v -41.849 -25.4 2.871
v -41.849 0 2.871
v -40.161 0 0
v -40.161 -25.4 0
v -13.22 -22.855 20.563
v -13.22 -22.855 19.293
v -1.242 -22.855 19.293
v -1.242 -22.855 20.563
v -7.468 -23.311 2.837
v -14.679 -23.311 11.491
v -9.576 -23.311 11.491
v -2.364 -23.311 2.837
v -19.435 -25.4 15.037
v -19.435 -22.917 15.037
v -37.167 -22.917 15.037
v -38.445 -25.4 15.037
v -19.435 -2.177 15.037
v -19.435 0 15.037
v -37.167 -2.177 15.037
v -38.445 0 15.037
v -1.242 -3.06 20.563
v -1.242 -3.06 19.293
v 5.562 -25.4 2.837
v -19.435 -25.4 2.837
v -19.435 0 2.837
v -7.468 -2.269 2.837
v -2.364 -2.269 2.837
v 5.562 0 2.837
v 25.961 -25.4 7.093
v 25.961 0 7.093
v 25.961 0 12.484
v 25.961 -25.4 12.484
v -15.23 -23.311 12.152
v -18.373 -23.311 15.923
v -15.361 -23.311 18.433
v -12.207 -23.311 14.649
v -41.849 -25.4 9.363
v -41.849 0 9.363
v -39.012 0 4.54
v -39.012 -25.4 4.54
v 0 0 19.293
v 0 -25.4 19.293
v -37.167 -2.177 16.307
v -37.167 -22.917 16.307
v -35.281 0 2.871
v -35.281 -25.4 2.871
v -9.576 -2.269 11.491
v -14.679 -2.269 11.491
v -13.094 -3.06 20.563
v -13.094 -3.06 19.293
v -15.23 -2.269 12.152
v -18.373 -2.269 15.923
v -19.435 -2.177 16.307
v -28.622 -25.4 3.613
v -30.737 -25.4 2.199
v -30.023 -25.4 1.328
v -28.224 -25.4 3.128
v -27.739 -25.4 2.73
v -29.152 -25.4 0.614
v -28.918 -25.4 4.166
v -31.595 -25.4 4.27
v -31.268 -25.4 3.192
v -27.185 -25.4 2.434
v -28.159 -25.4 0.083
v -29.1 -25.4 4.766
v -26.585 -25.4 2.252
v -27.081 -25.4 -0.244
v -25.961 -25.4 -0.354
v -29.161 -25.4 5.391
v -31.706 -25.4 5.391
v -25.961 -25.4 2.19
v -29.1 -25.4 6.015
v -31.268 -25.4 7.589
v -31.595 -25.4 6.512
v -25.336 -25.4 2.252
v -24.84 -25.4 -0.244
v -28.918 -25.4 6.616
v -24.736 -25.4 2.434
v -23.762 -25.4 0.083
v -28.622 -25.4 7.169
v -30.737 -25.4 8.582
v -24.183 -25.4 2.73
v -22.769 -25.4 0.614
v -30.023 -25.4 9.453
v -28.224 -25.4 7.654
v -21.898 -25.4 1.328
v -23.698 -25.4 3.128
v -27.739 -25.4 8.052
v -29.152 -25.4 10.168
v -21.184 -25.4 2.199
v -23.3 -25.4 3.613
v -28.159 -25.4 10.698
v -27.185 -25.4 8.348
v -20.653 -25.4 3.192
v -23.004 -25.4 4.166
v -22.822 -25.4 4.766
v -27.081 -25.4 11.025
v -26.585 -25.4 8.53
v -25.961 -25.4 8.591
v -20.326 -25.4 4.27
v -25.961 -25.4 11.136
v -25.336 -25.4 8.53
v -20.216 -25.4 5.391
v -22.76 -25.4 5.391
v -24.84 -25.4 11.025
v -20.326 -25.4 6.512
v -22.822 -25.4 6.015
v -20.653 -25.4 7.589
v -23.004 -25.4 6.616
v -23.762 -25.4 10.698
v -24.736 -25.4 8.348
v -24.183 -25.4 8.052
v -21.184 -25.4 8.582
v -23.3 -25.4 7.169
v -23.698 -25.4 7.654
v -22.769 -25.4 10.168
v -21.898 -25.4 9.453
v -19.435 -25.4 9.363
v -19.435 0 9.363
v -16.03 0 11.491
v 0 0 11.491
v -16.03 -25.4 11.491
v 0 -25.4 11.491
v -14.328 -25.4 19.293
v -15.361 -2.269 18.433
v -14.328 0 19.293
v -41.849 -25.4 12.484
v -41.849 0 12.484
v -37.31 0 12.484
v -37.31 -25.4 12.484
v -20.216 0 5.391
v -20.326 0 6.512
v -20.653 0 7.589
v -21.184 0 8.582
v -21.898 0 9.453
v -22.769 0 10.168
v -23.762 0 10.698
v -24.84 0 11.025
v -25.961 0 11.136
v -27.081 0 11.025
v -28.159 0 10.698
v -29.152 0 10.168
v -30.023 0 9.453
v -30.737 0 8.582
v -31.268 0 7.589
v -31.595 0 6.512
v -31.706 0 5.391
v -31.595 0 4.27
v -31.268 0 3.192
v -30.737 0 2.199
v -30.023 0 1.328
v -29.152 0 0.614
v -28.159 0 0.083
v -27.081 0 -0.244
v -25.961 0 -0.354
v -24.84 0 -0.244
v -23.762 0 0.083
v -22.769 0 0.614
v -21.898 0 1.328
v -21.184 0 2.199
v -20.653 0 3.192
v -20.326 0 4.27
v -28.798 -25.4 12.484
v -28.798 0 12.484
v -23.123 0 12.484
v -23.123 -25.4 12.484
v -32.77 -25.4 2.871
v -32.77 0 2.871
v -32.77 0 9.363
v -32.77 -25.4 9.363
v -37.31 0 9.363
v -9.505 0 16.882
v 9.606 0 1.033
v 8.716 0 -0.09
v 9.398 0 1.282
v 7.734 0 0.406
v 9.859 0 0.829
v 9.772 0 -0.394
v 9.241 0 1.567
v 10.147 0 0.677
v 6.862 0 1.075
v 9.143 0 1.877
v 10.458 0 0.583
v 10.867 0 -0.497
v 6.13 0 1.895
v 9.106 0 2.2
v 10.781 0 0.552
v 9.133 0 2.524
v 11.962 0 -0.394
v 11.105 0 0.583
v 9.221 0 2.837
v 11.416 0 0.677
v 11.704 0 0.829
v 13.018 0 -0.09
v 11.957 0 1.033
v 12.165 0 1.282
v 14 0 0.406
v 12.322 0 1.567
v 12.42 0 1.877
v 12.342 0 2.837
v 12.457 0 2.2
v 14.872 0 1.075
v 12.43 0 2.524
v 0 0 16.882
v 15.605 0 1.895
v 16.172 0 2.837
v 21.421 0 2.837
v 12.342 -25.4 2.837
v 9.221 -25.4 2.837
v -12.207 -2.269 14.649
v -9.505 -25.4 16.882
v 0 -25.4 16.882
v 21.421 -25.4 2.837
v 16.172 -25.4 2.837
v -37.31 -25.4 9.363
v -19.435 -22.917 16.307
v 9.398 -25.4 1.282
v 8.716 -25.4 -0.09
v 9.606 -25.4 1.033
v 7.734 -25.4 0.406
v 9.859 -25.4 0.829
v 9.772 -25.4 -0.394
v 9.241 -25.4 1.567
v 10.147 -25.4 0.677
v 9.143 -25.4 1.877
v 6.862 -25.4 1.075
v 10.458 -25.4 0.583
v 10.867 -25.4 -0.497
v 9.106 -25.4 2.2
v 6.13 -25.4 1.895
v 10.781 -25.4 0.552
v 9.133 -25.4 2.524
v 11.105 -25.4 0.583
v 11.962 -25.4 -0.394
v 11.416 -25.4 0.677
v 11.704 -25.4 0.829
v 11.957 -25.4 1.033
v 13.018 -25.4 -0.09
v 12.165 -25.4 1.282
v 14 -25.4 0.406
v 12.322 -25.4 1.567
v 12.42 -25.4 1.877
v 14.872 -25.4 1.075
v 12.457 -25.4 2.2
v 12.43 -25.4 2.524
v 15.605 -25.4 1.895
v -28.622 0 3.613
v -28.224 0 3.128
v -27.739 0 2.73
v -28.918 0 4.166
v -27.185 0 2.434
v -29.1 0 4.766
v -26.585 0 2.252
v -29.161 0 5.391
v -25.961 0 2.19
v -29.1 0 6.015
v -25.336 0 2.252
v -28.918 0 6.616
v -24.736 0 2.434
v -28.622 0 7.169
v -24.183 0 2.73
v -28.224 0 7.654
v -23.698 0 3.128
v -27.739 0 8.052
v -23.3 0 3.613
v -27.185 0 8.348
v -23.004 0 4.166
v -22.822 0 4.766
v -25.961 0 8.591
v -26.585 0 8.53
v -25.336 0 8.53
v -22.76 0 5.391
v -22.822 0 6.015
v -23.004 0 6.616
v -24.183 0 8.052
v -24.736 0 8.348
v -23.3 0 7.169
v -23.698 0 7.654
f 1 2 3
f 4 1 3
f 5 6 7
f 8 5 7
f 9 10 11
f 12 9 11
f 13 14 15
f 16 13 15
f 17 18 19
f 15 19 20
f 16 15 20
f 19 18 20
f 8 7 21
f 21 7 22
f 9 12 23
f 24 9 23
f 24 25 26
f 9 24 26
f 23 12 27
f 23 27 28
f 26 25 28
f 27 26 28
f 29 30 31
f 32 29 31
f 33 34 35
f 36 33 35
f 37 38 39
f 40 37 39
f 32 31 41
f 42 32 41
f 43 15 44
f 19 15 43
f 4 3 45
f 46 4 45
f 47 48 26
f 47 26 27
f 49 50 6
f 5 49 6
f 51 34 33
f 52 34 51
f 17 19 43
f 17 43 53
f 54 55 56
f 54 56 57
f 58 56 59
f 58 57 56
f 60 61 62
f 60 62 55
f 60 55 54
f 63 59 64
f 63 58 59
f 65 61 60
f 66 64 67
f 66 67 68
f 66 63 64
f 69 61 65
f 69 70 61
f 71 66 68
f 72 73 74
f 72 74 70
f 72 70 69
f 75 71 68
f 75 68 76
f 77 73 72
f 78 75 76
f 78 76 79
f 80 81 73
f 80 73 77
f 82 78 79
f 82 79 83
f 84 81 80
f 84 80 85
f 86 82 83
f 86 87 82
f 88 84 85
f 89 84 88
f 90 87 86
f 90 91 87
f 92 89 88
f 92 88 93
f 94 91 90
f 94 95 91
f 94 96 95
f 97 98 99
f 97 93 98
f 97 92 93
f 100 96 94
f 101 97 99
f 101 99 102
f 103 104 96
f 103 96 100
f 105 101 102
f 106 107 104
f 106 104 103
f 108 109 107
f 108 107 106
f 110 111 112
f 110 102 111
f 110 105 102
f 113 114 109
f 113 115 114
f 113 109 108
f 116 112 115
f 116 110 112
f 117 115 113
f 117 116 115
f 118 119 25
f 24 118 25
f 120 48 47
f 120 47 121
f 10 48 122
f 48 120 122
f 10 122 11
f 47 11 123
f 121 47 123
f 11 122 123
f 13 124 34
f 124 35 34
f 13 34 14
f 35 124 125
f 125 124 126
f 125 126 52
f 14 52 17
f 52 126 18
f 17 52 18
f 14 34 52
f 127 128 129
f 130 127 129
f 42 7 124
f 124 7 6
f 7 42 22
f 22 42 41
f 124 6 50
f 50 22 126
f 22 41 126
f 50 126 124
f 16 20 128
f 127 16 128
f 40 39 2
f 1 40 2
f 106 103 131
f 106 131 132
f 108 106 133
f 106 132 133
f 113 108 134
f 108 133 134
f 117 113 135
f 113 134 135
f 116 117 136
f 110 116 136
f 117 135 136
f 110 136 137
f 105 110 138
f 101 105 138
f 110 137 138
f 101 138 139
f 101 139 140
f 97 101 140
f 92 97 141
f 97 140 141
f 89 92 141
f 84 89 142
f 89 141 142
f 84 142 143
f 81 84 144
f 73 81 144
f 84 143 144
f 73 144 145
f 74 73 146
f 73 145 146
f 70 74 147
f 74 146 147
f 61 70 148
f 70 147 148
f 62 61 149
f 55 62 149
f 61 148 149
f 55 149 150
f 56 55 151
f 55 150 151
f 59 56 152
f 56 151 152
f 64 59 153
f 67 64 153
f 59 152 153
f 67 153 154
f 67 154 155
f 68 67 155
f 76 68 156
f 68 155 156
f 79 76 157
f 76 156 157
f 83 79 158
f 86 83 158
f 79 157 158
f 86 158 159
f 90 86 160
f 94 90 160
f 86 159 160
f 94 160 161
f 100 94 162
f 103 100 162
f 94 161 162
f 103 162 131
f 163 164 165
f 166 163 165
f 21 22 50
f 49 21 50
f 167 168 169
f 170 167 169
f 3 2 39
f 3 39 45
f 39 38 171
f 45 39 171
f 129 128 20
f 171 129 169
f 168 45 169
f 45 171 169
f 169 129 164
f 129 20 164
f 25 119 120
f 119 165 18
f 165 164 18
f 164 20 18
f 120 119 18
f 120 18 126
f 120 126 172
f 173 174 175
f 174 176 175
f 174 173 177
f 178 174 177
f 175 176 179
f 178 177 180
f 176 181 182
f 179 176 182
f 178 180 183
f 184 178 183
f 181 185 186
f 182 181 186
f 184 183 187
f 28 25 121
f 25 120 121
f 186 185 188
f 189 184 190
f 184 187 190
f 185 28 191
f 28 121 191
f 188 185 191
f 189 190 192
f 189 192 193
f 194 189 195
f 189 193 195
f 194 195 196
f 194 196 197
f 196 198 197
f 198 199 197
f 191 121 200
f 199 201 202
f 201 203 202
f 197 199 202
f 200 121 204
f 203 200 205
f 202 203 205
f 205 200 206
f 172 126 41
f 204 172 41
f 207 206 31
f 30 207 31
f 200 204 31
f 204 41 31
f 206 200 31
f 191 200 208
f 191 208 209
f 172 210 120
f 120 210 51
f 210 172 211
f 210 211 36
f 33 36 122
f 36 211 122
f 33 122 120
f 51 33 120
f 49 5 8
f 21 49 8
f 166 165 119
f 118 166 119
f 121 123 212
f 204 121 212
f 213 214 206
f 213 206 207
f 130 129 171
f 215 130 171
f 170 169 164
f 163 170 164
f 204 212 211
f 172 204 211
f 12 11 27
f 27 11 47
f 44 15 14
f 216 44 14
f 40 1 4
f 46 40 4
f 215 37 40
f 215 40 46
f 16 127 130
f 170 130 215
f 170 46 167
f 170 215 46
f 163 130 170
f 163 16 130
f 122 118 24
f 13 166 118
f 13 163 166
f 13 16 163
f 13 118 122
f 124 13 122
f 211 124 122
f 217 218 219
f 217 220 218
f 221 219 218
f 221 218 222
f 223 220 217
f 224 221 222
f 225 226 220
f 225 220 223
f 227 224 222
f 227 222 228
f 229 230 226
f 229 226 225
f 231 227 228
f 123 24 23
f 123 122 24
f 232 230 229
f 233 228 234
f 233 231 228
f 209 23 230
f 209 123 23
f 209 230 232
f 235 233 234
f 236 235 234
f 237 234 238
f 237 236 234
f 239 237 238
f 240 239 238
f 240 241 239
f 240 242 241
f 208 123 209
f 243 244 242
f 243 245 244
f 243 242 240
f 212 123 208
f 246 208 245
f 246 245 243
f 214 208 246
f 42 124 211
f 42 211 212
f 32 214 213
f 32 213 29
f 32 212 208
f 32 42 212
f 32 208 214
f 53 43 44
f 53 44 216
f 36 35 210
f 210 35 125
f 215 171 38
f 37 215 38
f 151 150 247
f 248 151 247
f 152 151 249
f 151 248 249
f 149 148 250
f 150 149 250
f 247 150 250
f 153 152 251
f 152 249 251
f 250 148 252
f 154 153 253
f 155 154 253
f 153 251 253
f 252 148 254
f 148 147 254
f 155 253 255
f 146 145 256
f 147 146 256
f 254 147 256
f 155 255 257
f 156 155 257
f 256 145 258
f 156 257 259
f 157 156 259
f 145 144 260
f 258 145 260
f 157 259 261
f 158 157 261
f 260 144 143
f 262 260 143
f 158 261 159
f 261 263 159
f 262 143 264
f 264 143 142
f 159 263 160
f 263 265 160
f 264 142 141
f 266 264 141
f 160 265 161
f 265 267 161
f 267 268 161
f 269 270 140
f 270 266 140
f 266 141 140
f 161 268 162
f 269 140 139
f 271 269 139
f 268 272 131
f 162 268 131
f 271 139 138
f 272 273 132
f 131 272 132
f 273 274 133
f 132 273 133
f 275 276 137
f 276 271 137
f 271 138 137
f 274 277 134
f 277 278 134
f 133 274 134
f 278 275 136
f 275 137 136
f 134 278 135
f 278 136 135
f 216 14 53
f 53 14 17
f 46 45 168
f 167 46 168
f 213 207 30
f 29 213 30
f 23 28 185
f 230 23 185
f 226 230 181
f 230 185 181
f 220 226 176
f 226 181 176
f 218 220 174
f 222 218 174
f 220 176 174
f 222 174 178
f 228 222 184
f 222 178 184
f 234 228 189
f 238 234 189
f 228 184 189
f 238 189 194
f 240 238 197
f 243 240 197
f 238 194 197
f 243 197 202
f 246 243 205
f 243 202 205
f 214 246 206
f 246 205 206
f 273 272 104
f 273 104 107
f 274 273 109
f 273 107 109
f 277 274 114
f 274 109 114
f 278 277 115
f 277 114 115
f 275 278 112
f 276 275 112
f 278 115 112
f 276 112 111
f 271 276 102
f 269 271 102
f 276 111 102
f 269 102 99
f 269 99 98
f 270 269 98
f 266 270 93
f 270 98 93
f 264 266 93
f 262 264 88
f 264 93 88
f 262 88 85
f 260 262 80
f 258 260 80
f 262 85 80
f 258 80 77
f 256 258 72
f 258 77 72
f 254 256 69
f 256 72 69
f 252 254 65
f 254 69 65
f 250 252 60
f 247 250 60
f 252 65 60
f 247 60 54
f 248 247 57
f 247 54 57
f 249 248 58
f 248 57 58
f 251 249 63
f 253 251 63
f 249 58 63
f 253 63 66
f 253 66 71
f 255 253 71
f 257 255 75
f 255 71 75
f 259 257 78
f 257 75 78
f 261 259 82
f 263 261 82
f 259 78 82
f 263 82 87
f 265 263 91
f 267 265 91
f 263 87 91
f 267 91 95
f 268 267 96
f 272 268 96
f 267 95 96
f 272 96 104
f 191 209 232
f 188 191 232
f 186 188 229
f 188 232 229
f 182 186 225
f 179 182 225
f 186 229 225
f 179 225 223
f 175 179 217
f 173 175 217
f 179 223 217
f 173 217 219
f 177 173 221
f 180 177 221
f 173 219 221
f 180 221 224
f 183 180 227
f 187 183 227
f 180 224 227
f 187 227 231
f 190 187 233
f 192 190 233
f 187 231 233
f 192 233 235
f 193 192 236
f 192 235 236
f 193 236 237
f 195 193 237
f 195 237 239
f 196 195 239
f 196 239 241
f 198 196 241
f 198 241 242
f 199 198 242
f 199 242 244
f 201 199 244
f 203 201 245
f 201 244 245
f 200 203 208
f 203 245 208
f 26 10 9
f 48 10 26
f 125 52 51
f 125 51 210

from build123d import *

# Parameters (mm, degrees)
F0_R      = 5.7449607944
F1_DEPTH  = 25.4
F0_R_2    = 5.8873482928
F4_DEPTH  = 25.4
F5_DEPTH  = 25.4
F6_R      = 3.20054545
F7_DEPTH  = 25.4
F9_DEPTH  = 25.4
F11_DEPTH = 25.4
F12_W     = 3.9208573289
F12_H     = 21.0416209884
F13_DEPTH = 25.4
F15_DEPTH = 27.94
F16_DEPTH = 25.4
F17_DEPTH = 1.27
F18_W     = 17.7321750671
F18_H     = 20.7401141524
F19_DEPTH = 2.54
F20_DEPTH = 1.27


with BuildPart() as f1:
    # F0 (on Front) → F1 (new body)
    with BuildSketch(Plane.XZ):
        with Locations((-25.9606912732, 5.3907446563)):
            Circle(F0_R)
    extrude(amount=F1_DEPTH)

    # F3 (on Front) → F5 (cut)
    with BuildSketch(Plane.XZ):
        Polygon((-13.9075210318, 17.5154227763), (-18.8151281327, 12.0304487646), (0, 11.7417657748), (7.4550076388, 14.0512287617), (0, 17.5154227763), align=None)
    extrude(amount=-F5_DEPTH, mode=Mode.SUBTRACT)

    # F6 (on face) → F7 (cut)
    with BuildSketch(Plane.XZ.offset(25.4)):
        with Locations((-25.9606912732, 5.3907446563)):
            Circle(F6_R)
    extrude(amount=-F7_DEPTH, mode=Mode.SUBTRACT)


with BuildPart() as f1b:
    # F0 (on Front) → F1, piece 2 (new body)
    with BuildSketch(Plane.XZ):
        with Locations((10.8671383932, 5.3907446563)):
            Circle(F0_R_2)
    extrude(amount=F1_DEPTH)

    # F2 (on Front) → F4 (join)
    with BuildSketch(Plane.XZ):
        Polygon((-19.4350536913, 9.36287269), (-19.4350536913, 2.8372341767), (21.4211158454, 2.8372341767), (25.9606931359, 7.0930854417), (25.9606931359, 12.4838305637), (0, 19.2931909114), (-14.328032732, 19.2931909114), (-19.4350536913, 15.0373410434), (-38.4445227683, 15.0373410434), (-41.8492034078, 12.4838305637), (-37.30962798, 12.4838305637), (-37.30962798, 9.36287269), (-41.8492034078, 9.36287269), (-39.0119701624, 4.5395744964), (-41.8492034078, 2.8706143439), (-40.1606073217, 0), (-35.2805612409, 2.8706143439), (-32.7700525522, 2.8706143439), (-32.7700525522, 9.36287269), (-28.7979245186, 12.4838305637), (-23.1234580278, 12.4838305637), align=None)
    extrude(amount=F4_DEPTH)

    # F8 (on face) → F9 (cut)
    with BuildSketch(Plane.XZ.offset(25.4)):
        with BuildLine():
            Line((12.3419677839, 2.8372341767), (9.2210108414, 2.8372341767))
            ThreePointArc((9.2210108414, 2.8372341767), (10.7814893126, 0.5517586494), (12.3419677839, 2.8372341767))
        make_face()
    extrude(amount=-F9_DEPTH, mode=Mode.SUBTRACT)

    # F10 (on face) → F11 (cut)
    with BuildSketch(Plane.XZ.offset(25.4)):
        Polygon((-9.5047345385, 16.8815422803), (-16.0303730518, 11.490797624), (0, 11.490797624), (0, 16.8815422803), align=None)
    extrude(amount=-F11_DEPTH, mode=Mode.SUBTRACT)

    # F12 (on face) → F13 (cut)
    with BuildSketch(Plane(origin=(-15.3605972177, 0, 18.432720695), x_dir=(0.7682213485, 0, 0.640184317), z_dir=(-0.640184317, 0, 0.7682213485))):
        with Locations((-1.9604286645, -12.7899905201)):
            Rectangle(F12_W, F12_H)
    extrude(amount=-F13_DEPTH, mode=Mode.SUBTRACT)

    # F14 (on face) → F15 (join)
    with BuildSketch(Plane.XY.offset(19.2931909114)):
        Polygon((-1.2421964202, -3.0599406455), (-13.0937732756, -3.0599406455), (-13.2198538631, -22.8545945138), (-1.2421964202, -22.8545945138), align=None)
    extrude(amount=F15_DEPTH)

    # F16 (cut): a face of the model
    f16_faces = [f1b.faces().sort_by_distance(p)[0] for p in [
        (-7.1995605859, -12.9747231803, 47.2331909114),
    ]]
    extrude(f16_faces, amount=-F16_DEPTH, mode=Mode.SUBTRACT)

    # F17 (cut): a face of the model
    f17_faces = [f1b.faces().sort_by_distance(p)[0] for p in [
        (-7.1995605859, -12.9747231803, 21.8331909114),
    ]]
    extrude(f17_faces, amount=-F17_DEPTH, mode=Mode.SUBTRACT)

    # F18 (on face) → F19 (join)
    with BuildSketch(Plane.XY.offset(15.0373410434)):
        with Locations((-28.3011412248, -12.5466659665)):
            Rectangle(F18_W, F18_H)
    extrude(amount=F19_DEPTH)

    # F20 (cut): a face of the model
    f20_faces = [f1b.faces().sort_by_distance(p)[0] for p in [
        (-28.3011412248, -12.5466659665, 17.5773410434),
    ]]
    extrude(f20_faces, amount=-F20_DEPTH, mode=Mode.SUBTRACT)


solid = Compound([f1.part, f1b.part])
